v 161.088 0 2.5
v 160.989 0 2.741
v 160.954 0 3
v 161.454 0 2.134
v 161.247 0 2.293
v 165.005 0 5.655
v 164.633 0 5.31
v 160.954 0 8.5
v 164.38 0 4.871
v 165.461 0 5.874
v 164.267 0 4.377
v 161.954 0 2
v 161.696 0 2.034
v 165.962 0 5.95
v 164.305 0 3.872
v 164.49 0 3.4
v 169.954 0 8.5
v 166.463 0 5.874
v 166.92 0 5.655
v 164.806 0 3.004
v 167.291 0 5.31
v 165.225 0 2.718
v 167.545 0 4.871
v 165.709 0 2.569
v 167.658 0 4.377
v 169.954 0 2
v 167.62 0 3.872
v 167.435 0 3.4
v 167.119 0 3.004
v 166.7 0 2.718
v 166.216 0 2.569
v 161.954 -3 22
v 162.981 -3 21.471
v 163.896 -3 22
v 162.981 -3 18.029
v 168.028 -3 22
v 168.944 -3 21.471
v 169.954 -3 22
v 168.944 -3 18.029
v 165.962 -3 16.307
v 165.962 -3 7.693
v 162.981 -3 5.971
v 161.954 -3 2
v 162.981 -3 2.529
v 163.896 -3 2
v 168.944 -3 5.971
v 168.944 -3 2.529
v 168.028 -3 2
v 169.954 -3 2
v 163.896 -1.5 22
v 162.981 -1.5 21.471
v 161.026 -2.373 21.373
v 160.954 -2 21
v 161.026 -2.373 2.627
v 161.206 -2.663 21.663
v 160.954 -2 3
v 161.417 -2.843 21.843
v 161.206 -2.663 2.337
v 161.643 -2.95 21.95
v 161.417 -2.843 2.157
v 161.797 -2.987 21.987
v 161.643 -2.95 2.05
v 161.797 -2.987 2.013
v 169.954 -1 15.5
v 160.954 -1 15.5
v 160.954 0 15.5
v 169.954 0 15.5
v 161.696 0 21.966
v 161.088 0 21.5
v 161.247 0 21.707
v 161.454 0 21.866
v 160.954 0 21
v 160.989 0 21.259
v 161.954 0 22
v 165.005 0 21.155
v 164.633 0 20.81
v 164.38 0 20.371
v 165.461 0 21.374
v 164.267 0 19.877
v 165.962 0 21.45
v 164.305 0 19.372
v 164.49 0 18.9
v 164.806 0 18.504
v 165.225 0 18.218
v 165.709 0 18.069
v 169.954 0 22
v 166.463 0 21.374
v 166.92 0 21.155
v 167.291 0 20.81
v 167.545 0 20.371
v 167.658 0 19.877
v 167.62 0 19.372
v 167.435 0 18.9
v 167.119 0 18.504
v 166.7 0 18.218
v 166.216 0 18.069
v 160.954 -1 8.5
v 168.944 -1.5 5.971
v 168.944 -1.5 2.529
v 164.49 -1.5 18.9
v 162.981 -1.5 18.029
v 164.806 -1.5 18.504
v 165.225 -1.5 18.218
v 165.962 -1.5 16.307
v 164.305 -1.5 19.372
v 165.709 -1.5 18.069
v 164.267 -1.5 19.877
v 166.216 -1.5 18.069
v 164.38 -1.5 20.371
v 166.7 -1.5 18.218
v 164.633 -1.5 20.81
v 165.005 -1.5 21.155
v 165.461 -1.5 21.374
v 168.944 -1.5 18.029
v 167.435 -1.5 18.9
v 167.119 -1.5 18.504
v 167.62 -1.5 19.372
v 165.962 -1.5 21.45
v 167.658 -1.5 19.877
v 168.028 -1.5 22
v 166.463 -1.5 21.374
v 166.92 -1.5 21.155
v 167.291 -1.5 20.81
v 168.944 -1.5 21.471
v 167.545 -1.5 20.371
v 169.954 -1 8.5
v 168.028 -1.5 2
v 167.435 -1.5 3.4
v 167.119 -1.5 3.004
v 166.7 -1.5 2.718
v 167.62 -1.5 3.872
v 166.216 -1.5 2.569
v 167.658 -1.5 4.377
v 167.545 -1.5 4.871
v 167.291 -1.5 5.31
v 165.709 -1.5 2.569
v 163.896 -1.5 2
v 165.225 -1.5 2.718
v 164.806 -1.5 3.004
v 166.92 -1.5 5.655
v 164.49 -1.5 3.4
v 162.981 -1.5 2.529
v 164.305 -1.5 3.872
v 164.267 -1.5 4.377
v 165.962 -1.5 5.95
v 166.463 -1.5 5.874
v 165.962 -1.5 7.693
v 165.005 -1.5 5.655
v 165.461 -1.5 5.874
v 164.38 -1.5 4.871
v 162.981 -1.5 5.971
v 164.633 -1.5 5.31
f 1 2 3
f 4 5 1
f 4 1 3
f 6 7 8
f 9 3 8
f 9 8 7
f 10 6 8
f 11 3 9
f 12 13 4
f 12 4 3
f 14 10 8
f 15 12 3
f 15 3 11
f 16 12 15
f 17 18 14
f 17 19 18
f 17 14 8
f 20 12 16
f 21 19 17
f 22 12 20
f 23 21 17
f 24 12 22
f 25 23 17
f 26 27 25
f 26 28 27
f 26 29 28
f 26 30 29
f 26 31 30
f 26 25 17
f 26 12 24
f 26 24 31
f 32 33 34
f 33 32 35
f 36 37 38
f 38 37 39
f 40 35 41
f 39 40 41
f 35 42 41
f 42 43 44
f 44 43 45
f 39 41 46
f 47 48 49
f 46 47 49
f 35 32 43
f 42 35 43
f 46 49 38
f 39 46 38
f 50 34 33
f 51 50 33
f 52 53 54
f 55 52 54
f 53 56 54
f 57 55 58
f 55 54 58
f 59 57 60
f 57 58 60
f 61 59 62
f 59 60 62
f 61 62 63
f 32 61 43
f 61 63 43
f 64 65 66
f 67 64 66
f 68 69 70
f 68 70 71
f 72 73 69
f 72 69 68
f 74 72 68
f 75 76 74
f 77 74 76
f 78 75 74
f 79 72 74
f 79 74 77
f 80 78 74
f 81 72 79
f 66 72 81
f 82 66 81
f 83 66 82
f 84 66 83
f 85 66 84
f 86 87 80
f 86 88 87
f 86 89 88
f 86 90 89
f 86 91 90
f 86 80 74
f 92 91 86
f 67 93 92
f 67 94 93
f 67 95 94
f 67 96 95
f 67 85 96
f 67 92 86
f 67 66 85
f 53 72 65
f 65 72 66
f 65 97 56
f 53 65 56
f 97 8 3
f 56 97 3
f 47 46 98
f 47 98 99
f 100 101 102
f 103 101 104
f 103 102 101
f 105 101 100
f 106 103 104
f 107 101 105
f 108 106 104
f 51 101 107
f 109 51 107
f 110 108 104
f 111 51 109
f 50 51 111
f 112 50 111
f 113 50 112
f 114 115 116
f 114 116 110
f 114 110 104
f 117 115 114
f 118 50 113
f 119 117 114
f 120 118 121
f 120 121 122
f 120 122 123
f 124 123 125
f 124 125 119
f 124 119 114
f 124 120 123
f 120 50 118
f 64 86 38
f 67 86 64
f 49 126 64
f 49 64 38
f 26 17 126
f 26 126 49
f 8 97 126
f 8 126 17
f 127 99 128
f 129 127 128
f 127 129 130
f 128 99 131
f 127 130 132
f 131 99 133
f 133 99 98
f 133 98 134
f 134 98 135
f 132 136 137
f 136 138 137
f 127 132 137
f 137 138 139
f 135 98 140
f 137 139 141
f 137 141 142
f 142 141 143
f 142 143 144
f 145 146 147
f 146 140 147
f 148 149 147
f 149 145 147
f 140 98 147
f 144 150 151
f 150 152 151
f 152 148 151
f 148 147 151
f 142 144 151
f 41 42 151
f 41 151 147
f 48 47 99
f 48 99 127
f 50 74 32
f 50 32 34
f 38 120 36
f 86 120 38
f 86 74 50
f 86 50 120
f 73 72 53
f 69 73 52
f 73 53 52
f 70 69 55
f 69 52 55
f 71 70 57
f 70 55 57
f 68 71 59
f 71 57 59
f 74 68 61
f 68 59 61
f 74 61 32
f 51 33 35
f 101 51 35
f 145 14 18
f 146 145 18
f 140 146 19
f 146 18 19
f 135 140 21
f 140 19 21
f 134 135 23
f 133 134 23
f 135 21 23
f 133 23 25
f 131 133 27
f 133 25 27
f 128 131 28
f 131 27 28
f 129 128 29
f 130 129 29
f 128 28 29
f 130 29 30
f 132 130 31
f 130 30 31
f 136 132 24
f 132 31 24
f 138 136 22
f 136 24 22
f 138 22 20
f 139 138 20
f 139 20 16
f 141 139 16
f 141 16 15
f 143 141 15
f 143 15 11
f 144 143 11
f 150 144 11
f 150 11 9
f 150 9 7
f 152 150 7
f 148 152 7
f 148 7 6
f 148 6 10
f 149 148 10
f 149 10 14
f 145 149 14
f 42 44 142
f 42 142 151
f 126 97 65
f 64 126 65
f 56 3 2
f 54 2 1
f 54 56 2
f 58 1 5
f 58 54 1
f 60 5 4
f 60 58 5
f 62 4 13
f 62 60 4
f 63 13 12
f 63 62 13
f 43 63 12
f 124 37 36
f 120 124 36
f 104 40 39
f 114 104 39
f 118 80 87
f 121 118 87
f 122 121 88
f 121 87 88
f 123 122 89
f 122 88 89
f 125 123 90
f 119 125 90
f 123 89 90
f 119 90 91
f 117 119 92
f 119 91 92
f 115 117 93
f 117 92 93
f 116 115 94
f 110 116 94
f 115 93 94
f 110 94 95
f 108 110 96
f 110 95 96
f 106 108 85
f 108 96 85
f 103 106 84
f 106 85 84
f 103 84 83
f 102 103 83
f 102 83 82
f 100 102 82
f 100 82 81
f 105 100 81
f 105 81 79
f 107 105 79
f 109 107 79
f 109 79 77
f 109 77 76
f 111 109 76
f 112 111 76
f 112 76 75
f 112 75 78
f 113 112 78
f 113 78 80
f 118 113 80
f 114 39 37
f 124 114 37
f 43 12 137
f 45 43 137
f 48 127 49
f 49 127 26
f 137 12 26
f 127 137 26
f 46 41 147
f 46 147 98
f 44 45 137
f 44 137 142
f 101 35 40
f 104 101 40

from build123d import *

# Parameters (mm, degrees)
CROQUIS1_W              = 9
CROQUIS1_H              = 20
CROQUIS1_R              = 1.7
SALIENTE_EXTRUIR1_DEPTH = 3
CORTAR_EXTRUIR2_DEPTH   = 1.5
CORTAR_EXTRUIR3_REACH   = 25.958
CROQUIS3_W              = 7
CROQUIS3_H              = 1
REDONDEO1_R             = 1


with BuildPart() as part:
    # Croquis1 → Saliente-Extruir1 (new body)
    with BuildSketch(Plane(origin=(0, 0, 0), x_dir=(1, 0, 0), z_dir=(0, 1, 0))):
        with Locations((165.454426616, -12)):
            Rectangle(CROQUIS1_W, CROQUIS1_H)
        with Locations(Location((165.962302832, -4.25, 0), (0, 0, 270))):
            Circle(CROQUIS1_R, mode=Mode.SUBTRACT)
        with Locations(Location((165.962302832, -19.75, 0), (0, 0, 270))):
            Circle(CROQUIS1_R, mode=Mode.SUBTRACT)
    extrude(amount=-SALIENTE_EXTRUIR1_DEPTH)

    # Croquis2 → Cortar-Extruir2 (cut)
    with BuildSketch(Plane.XZ.offset(3)):
        Polygon((168.943819954, 21.471379713), (165.962302832, 23.192759426), (162.98078571, 21.471379713), (162.98078571, 18.028620287), (165.962302832, 16.307240574), (168.943819954, 18.028620287), align=None)
        Polygon((168.943819954, 5.971379713), (168.943819954, 2.528620287), (165.962302832, 0.807240574), (162.98078571, 2.528620287), (162.98078571, 5.971379713), (165.962302832, 7.692759426), align=None)
    extrude(amount=-CORTAR_EXTRUIR2_DEPTH, mode=Mode.SUBTRACT)

    # Croquis3 → Cortar-Extruir3 (cut, up to next)
    with BuildSketch(Plane.ZY.offset(-160.954426616), mode=Mode.PRIVATE) as cortar_extruir3_sk1:
        with Locations((12, -0.5)):
            Rectangle(CROQUIS3_W, CROQUIS3_H)
    cortar_extruir3_tool1 = extrude(cortar_extruir3_sk1.sketch, amount=-CORTAR_EXTRUIR3_REACH, mode=Mode.PRIVATE) & part.part
    add(cortar_extruir3_tool1.solids().sort_by_distance((160.954427, -0.5, 12))[0], mode=Mode.SUBTRACT)

    # Redondeo1
    redondeo1_edges = [part.edges().sort_by_distance(p)[0] for p in [
        (160.954426616, -3, 12),
        (160.954426616, -1.5, 2),
        (160.954426616, -1.5, 22),
    ]]
    fillet(redondeo1_edges, radius=REDONDEO1_R)


solid = part.part
